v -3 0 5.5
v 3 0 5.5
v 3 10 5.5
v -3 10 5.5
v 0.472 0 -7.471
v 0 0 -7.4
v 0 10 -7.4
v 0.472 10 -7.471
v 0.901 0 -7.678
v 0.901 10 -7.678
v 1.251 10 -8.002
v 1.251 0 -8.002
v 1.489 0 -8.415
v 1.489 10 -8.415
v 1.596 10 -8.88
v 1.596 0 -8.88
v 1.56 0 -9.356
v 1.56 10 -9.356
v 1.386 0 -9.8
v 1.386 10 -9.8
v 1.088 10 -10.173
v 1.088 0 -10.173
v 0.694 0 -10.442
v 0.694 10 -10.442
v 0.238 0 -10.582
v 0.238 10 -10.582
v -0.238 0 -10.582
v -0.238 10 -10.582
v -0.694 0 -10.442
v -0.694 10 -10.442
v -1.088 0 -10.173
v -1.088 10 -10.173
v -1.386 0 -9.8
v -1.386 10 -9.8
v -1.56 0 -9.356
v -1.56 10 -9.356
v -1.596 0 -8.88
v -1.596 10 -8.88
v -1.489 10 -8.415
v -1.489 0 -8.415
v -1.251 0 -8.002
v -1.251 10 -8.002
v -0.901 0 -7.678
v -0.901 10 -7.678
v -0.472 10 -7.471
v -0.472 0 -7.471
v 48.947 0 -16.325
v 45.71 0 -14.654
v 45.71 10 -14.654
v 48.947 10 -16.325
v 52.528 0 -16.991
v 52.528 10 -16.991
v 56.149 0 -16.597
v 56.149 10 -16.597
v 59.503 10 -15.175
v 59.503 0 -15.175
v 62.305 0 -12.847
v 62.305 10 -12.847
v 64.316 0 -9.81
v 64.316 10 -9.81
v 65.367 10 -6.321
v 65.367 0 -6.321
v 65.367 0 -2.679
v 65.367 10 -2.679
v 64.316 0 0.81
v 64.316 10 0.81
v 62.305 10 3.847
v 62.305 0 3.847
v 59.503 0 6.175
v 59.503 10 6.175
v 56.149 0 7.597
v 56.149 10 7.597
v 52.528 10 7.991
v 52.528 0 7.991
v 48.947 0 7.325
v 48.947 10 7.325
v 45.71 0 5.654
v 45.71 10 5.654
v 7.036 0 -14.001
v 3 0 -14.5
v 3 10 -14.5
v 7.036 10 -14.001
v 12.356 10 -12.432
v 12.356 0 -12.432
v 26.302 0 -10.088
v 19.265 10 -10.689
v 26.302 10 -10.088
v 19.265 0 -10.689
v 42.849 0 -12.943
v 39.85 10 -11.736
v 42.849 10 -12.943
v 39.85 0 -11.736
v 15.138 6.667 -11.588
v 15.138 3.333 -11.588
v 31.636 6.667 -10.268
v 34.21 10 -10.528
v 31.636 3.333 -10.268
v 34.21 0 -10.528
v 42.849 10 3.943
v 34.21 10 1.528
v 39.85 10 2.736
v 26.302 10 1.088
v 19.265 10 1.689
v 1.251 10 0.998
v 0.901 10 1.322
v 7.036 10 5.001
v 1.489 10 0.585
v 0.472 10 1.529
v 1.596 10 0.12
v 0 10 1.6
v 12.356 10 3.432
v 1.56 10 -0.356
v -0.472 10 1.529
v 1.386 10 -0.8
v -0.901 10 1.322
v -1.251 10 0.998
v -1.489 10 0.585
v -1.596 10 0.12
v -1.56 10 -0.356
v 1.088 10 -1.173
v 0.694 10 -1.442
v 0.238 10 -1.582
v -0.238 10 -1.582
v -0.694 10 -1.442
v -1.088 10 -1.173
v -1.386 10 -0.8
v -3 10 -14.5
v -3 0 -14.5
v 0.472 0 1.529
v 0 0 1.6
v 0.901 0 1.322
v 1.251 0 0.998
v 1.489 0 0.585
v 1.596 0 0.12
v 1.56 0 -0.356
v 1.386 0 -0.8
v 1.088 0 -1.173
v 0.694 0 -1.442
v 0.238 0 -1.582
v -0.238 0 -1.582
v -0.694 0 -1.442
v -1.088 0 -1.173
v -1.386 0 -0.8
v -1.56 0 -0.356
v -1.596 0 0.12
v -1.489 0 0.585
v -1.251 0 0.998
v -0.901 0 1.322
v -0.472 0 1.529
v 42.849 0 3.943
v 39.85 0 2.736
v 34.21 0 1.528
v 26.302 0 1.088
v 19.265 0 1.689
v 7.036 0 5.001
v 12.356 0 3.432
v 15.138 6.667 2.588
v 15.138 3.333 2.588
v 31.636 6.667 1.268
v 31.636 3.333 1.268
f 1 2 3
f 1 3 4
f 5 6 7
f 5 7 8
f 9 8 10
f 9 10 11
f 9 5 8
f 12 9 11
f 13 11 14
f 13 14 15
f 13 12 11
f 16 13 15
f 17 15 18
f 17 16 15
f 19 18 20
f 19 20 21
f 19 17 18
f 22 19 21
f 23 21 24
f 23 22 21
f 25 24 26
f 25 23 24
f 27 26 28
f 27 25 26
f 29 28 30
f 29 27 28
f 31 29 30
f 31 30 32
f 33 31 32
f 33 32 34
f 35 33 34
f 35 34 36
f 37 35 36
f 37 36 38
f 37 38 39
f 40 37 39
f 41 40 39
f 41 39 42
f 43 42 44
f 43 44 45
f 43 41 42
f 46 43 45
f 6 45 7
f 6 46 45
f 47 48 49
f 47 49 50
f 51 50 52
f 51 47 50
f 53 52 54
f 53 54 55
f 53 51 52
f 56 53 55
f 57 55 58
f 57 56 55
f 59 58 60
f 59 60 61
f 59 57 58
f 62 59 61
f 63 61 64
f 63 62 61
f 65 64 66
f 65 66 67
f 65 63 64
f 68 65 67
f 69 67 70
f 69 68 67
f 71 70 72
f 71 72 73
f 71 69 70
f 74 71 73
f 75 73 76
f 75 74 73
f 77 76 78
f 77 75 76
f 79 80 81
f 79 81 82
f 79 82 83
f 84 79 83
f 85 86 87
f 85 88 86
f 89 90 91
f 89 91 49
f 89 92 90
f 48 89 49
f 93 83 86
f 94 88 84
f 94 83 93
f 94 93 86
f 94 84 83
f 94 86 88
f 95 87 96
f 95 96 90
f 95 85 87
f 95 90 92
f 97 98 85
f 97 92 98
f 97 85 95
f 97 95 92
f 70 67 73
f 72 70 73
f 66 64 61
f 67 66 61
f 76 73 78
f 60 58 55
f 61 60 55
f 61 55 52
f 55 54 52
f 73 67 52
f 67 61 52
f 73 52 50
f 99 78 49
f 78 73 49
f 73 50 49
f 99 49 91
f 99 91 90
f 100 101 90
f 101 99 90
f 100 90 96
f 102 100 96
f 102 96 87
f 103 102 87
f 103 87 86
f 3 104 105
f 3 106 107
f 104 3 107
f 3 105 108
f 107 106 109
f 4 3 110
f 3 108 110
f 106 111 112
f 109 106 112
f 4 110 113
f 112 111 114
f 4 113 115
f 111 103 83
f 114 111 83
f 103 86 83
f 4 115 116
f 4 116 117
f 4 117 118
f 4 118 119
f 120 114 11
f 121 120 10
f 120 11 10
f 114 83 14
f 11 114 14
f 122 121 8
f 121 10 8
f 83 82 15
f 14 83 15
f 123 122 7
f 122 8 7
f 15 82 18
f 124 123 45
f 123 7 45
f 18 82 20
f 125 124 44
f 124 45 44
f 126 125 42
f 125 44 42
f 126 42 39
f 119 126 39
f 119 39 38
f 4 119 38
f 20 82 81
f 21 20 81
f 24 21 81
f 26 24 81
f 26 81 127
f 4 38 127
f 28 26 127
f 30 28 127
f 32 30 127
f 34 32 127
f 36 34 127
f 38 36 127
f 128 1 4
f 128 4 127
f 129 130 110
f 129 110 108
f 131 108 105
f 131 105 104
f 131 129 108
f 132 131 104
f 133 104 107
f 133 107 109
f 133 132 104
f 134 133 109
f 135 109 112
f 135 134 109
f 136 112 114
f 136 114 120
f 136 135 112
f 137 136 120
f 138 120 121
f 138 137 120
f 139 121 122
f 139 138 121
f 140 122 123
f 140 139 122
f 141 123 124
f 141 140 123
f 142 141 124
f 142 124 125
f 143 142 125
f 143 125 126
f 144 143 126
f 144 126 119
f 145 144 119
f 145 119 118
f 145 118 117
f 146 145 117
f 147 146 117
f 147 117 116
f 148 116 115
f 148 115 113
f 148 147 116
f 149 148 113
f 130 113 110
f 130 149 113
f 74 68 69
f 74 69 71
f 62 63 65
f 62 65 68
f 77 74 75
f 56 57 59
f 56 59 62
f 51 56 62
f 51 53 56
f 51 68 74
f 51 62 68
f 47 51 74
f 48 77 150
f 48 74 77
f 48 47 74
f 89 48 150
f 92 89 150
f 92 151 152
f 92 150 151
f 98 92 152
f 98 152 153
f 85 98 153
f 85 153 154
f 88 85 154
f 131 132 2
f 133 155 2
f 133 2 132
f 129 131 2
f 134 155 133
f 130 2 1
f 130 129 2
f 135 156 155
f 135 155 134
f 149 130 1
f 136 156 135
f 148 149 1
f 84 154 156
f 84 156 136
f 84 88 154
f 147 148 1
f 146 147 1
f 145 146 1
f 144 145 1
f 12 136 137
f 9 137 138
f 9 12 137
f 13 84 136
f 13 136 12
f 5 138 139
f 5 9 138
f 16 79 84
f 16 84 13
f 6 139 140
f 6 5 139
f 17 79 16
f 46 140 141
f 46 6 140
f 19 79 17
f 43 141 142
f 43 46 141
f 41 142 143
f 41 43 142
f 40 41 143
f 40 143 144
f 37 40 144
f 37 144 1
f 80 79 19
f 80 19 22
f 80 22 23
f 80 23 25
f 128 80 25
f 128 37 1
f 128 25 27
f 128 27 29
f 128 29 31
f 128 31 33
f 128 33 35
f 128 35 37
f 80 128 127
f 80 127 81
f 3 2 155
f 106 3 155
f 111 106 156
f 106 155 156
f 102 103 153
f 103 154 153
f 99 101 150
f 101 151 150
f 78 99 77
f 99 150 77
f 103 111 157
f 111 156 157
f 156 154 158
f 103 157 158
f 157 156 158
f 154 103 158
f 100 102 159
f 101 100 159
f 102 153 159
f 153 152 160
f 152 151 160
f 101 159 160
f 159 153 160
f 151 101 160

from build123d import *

# Parameters (mm, degrees)
SKETCH1_R           = 1.6
BOSS_EXTRUDE1_DEPTH = 10


with BuildPart() as part:
    # Sketch1 → Boss-Extrude1 (new body)
    with BuildSketch(Plane(origin=(0, 0, 0), x_dir=(1, 0, 0), z_dir=(0, 1, 0))):
        with BuildLine():
            Line((-3, 14.5), (3, 14.5))
            add(Edge.make_bspline(
                [(3, 14.5), (7.114682306, 14.5), (16.320193537, 10.316763311), (31.07742048, 9.595600445), (41.442510879, 11.590070739), (45.709603601, 14.653822942)],
                knots=[0, 0, 0, 0, 0.28514411, 0.663251595, 1, 1, 1, 1], degree=3))
            ThreePointArc((45.709603601, 14.653822942), (65.5, 4.5), (45.709603601, -5.653822942))
            add(Edge.make_bspline(
                [(3, -5.5), (7.114682306, -5.5), (16.320193537, -1.316763311), (31.07742048, -0.595600445), (41.442510879, -2.590070739), (45.709603601, -5.653822942)],
                knots=[0, 0, 0, 0, 0.28514411, 0.663251595, 1, 1, 1, 1], degree=3))
            Line((3, -5.5), (-3, -5.5))
            Line((-3, -5.5), (-3, 14.5))
        make_face()
        with Locations(Location((0, 0, 0), (0, 0, 270))):
            Circle(SKETCH1_R, mode=Mode.SUBTRACT)
        with Locations(Location((0, 9, 0), (0, 0, 270))):
            Circle(SKETCH1_R, mode=Mode.SUBTRACT)
    extrude(amount=BOSS_EXTRUDE1_DEPTH)


solid = part.part
